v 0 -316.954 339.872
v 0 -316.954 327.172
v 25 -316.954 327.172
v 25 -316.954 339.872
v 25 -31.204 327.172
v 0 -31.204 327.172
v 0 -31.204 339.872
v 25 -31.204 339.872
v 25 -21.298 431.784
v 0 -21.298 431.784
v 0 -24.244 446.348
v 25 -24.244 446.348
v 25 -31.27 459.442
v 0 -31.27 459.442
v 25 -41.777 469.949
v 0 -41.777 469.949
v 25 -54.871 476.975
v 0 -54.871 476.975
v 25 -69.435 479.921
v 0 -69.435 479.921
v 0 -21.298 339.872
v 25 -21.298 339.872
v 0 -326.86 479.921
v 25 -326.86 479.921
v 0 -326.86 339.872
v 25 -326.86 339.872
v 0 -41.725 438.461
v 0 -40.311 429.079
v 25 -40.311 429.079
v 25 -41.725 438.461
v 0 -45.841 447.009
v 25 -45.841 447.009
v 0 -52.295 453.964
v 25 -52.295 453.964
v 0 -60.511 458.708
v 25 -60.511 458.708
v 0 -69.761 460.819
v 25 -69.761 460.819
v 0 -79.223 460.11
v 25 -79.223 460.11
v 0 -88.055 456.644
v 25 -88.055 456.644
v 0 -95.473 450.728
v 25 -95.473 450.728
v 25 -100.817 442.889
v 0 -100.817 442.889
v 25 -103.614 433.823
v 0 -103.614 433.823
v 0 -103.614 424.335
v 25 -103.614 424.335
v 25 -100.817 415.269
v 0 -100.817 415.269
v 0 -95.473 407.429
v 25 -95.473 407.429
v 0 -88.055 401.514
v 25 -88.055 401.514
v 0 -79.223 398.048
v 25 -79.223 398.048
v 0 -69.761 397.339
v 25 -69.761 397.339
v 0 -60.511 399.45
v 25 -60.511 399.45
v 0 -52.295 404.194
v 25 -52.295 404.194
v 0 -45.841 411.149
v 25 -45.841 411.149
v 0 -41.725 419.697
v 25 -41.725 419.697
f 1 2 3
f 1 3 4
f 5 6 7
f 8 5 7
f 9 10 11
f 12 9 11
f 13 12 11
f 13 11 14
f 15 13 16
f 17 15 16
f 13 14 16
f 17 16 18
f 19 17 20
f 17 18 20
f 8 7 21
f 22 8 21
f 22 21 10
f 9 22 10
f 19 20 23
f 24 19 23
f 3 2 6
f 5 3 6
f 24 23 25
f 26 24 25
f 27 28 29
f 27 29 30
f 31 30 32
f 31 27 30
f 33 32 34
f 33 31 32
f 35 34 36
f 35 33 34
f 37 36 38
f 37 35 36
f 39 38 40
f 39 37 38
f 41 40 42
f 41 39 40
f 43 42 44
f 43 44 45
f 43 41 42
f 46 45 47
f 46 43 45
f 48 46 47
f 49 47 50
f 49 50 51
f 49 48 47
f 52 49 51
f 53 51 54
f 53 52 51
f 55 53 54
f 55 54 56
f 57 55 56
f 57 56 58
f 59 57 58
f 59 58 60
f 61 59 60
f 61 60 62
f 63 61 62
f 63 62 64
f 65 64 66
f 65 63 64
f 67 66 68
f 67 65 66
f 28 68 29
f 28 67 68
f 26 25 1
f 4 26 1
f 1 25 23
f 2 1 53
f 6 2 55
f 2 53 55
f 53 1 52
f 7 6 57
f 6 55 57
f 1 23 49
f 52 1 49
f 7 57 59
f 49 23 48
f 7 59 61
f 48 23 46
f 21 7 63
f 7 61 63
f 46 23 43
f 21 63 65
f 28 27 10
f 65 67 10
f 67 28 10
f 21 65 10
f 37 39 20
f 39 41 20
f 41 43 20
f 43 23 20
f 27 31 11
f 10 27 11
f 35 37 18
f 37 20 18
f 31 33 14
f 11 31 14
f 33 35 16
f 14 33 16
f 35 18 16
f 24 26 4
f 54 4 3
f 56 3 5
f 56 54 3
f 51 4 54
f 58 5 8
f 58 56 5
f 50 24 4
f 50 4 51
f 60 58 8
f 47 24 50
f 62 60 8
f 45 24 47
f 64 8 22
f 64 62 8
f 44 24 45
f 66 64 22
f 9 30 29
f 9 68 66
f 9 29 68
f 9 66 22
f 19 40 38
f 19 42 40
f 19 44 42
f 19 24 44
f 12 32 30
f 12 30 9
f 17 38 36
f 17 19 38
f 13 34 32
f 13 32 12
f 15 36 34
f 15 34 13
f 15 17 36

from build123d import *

# Parameters (mm, degrees)
F0_W     = 285.75
F0_H     = 12.7
F0_R     = 31.829375
F1_DEPTH = 25


# Not quite as in the source:
# - ends of sketch curves that miss each other by under 0.0002 mm in the source are joined


with BuildPart() as f1:
    # F0 (on Right) → F1 (new body)
    with BuildSketch(Plane.YZ):
        with Locations((-174.078946, 333.521804)):
            Rectangle(F0_W, F0_H)
        with BuildLine():
            Line((-316.953946, 339.871804), (-31.203946, 339.871804))
            Line((-31.203946, 339.871804), (-21.297946, 339.871804))
            Line((-21.297946, 339.871804), (-21.297946, 431.783595))
            ThreePointArc((-21.297946, 431.783595), (-36.138421464, 465.080578536), (-69.4354049904, 479.9210541806))
            Line((-69.4354049904, 479.9210541806), (-326.859946, 479.921054))
            Line((-326.859946, 479.921054), (-326.859946, 339.871804))
            Line((-326.859946, 339.871804), (-316.953946, 339.871804))
        make_face()
        with Locations((-72.140054, 429.078946)):
            Circle(F0_R, mode=Mode.SUBTRACT)
    extrude(amount=F1_DEPTH)


solid = f1.part
